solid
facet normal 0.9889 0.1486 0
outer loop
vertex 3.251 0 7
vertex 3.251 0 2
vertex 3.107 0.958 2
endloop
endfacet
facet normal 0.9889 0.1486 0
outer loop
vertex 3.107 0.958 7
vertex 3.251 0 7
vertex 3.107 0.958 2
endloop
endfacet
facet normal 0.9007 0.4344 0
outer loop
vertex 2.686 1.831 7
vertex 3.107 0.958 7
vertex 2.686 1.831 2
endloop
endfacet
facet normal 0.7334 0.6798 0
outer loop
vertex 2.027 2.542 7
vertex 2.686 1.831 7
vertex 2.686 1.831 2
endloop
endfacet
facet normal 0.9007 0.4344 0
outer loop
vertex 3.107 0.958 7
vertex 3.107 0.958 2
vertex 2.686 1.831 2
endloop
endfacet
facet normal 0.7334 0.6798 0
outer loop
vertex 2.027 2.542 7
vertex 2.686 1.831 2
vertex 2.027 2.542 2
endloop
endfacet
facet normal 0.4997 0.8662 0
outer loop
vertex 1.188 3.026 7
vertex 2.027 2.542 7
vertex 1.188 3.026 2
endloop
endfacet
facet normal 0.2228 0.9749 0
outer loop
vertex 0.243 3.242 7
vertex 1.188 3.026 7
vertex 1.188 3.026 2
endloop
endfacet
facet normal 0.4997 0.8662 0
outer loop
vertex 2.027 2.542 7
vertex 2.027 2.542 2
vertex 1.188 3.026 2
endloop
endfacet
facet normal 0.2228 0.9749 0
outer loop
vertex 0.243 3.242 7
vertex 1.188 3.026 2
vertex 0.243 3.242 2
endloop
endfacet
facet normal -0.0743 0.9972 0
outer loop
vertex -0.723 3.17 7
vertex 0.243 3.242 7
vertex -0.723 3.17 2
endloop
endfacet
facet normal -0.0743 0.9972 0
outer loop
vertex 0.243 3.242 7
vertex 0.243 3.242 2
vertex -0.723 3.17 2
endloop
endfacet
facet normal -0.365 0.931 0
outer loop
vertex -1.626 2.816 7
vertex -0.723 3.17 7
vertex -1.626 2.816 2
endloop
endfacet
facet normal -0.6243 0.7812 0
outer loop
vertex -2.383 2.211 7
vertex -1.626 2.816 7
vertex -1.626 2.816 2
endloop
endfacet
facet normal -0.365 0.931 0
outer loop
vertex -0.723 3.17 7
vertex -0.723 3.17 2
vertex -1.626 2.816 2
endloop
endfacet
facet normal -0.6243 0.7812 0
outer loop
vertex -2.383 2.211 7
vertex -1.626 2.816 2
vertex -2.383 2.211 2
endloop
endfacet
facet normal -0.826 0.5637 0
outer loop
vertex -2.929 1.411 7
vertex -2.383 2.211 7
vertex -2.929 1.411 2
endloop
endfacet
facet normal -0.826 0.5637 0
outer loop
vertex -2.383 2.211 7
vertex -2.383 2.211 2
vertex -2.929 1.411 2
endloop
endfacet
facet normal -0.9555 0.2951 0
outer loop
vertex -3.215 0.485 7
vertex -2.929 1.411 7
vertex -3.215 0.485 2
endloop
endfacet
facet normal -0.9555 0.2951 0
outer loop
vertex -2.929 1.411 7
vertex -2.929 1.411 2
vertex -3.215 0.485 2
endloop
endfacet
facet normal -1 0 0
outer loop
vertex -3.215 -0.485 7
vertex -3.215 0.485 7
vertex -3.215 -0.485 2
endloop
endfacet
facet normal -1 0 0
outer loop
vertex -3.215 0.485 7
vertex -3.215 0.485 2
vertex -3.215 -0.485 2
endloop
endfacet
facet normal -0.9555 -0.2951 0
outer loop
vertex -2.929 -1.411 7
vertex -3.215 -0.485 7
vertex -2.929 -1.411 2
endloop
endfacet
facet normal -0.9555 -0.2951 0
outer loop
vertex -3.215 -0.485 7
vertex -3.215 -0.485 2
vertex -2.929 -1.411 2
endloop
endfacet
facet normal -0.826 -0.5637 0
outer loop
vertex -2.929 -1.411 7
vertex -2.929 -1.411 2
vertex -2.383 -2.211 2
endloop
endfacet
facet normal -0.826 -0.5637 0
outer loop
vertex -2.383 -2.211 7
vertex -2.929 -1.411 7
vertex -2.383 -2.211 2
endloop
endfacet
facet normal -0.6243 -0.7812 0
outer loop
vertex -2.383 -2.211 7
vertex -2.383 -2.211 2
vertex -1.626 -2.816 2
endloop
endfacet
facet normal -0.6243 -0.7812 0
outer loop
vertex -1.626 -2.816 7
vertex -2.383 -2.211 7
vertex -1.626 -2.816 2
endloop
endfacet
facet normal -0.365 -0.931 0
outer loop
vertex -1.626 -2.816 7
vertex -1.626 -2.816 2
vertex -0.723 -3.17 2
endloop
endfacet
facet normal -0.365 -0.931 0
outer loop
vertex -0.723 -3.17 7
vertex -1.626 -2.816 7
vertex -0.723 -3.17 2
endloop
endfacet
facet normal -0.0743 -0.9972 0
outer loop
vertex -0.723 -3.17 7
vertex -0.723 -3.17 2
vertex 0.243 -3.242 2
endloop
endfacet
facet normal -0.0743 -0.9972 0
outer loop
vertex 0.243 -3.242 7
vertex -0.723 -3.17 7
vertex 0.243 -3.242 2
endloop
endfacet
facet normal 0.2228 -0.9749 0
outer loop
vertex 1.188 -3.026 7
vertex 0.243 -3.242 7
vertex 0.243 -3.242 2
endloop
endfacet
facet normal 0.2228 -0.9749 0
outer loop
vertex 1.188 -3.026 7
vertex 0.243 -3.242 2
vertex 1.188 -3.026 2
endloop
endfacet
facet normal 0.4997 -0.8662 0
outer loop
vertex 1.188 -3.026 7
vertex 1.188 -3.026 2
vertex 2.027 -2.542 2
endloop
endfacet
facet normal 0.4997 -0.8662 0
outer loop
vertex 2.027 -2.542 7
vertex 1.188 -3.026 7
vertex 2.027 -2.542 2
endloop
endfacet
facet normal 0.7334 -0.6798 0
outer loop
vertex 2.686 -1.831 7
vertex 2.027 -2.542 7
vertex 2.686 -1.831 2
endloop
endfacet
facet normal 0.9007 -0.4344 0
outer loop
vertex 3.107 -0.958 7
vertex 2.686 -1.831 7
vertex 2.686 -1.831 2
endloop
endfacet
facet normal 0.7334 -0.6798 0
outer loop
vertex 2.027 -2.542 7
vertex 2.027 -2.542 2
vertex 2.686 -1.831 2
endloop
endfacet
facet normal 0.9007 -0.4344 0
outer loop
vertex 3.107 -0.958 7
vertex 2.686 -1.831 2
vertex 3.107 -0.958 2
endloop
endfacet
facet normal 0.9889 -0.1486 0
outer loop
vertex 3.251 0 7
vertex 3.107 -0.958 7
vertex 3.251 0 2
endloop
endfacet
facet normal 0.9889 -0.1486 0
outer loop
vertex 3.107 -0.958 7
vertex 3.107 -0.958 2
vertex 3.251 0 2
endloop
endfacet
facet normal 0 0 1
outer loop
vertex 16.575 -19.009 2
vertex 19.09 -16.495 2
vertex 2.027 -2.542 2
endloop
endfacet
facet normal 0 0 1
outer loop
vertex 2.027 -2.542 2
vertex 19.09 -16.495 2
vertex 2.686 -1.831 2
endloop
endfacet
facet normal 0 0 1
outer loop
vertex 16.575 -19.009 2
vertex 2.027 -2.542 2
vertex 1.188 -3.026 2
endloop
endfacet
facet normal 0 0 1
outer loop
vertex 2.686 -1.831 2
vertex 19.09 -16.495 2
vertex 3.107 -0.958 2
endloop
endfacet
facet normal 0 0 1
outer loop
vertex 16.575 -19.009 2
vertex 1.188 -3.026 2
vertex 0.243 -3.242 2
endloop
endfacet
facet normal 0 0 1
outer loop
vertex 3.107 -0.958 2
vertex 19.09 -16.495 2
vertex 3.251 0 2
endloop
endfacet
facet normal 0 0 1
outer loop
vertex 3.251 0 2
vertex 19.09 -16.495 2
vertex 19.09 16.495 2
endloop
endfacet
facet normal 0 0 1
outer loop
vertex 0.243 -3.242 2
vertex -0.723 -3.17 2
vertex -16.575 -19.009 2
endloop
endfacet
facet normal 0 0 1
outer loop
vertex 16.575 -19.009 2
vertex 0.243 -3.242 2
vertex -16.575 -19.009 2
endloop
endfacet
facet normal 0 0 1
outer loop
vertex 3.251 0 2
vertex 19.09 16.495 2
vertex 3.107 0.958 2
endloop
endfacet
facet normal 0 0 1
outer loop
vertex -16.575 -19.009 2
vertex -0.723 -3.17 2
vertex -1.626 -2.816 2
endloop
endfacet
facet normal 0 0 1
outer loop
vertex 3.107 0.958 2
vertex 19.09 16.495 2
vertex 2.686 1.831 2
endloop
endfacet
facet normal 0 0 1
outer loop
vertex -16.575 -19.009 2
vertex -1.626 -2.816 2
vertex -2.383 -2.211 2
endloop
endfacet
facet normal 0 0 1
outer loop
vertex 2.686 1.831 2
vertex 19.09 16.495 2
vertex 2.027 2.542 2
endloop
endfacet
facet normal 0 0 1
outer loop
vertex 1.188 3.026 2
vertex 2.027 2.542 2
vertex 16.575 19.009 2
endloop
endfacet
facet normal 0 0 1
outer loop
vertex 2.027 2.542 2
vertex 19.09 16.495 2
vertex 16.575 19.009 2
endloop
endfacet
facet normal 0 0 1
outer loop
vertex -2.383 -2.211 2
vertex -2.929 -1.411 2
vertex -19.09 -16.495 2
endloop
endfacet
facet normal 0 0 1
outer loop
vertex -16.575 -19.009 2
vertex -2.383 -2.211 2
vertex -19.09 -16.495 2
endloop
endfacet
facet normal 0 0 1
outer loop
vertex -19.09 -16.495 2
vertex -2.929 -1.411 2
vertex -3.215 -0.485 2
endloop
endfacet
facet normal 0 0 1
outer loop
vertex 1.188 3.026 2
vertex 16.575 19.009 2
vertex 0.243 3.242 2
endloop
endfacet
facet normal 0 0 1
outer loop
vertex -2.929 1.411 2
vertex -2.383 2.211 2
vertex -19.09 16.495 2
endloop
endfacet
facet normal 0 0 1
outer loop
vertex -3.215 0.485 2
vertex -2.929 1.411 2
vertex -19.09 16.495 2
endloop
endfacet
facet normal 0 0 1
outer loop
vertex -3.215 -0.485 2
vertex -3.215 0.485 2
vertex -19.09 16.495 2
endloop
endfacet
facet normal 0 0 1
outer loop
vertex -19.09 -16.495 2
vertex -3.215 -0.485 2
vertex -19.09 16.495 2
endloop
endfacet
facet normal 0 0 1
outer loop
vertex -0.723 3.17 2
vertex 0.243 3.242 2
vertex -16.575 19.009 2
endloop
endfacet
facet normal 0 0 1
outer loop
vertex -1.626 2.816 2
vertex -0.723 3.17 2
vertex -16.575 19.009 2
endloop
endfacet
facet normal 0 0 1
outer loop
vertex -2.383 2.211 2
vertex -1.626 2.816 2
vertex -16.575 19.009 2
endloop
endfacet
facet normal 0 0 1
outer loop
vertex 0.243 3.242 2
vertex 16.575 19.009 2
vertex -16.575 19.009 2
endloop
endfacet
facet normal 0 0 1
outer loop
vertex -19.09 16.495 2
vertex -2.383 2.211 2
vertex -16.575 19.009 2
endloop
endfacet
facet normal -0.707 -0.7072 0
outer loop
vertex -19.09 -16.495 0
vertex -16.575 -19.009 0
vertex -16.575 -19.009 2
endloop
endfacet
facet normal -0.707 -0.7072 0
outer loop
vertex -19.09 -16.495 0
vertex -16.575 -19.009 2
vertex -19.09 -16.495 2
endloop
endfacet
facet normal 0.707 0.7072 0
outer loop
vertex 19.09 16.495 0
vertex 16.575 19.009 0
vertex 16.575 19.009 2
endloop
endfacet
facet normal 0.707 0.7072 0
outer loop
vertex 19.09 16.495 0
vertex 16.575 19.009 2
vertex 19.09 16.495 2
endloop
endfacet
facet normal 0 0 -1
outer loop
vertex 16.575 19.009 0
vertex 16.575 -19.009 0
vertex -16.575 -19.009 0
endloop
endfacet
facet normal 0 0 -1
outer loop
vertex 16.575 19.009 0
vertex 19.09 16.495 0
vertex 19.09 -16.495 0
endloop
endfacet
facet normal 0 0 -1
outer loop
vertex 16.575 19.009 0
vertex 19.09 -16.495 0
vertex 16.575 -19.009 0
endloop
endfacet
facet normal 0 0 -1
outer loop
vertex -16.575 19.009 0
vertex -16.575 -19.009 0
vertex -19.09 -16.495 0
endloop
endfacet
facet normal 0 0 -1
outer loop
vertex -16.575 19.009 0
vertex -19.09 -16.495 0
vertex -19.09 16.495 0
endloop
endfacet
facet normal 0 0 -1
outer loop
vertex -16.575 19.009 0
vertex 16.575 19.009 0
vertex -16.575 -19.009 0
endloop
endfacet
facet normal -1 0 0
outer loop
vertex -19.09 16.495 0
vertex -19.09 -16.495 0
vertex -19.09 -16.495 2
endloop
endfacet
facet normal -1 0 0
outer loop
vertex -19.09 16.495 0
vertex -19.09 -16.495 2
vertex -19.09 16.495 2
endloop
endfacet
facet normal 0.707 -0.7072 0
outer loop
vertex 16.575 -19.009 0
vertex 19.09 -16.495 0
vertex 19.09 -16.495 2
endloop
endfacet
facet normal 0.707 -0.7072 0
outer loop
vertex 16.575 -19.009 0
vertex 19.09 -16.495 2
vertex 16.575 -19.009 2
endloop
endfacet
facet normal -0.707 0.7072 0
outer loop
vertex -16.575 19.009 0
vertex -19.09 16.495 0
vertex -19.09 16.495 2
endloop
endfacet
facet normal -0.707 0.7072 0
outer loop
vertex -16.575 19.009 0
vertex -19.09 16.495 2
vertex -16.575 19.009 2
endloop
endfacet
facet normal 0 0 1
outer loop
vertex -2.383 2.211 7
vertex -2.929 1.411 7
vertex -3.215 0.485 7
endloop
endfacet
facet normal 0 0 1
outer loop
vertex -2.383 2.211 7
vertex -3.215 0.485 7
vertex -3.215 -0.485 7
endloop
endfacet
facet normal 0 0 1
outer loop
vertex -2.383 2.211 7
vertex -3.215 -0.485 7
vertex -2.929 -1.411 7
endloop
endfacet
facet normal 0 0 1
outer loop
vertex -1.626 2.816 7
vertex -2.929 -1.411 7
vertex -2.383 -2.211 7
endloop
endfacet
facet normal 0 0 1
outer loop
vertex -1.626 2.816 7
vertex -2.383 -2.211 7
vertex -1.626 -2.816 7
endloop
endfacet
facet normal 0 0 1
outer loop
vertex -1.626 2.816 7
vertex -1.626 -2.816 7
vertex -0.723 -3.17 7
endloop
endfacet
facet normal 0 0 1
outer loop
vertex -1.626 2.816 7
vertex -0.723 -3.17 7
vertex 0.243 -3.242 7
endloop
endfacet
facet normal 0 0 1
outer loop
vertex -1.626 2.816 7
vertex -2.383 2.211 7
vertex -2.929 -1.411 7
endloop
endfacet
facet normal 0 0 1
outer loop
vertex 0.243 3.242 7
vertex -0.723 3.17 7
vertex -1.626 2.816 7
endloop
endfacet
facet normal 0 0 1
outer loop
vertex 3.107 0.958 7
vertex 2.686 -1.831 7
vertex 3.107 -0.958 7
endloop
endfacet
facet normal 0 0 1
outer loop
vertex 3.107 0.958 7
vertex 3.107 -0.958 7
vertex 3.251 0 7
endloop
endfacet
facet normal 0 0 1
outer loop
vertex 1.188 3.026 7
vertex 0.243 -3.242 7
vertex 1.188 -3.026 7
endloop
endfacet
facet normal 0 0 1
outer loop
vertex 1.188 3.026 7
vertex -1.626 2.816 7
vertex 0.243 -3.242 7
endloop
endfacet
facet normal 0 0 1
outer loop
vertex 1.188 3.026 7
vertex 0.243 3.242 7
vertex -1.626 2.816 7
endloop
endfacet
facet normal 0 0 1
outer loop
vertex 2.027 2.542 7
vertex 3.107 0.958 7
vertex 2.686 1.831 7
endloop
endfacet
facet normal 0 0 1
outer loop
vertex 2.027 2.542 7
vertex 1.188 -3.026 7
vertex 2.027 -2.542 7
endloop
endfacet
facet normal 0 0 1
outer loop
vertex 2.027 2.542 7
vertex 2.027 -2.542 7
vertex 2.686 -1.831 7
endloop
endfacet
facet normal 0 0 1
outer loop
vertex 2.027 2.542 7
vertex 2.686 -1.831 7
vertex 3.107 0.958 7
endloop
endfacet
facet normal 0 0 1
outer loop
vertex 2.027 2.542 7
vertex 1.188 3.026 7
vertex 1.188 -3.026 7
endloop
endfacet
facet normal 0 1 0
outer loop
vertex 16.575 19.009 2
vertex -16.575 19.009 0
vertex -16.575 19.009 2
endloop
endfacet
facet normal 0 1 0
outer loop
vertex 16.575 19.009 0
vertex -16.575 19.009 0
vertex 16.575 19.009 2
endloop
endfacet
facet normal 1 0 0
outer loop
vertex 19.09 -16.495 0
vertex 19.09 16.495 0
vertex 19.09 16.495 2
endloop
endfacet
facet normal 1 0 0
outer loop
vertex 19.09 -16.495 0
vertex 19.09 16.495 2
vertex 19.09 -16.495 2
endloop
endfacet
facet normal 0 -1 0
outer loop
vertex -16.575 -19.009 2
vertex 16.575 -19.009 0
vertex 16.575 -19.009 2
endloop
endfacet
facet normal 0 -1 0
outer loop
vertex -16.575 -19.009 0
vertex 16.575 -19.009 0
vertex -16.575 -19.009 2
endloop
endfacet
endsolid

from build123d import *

# Parameters (mm, degrees)
BOSS_EXTRUDE1_DEPTH = 2
SKETCH3_R           = 3.2512
BOSS_EXTRUDE2_DEPTH = 5


with BuildPart() as part:
    # Sketch2 → Boss-Extrude1 (new body)
    with BuildSketch(Plane.XY):
        Polygon((16.575197596, -19.009332943), (-16.575197596, -19.009332943), (-19.089797596, -16.494732943), (-19.089797596, 16.494732943), (-16.575197596, 19.009332943), (16.575197596, 19.009332943), (19.089797596, 16.494732943), (19.089797596, -16.494732943), align=None)
    extrude(amount=BOSS_EXTRUDE1_DEPTH)

    # Sketch3 → Boss-Extrude2 (add)
    with BuildSketch(Plane.XY.offset(2)):
        Circle(SKETCH3_R)
    extrude(amount=BOSS_EXTRUDE2_DEPTH)


solid = part.part
